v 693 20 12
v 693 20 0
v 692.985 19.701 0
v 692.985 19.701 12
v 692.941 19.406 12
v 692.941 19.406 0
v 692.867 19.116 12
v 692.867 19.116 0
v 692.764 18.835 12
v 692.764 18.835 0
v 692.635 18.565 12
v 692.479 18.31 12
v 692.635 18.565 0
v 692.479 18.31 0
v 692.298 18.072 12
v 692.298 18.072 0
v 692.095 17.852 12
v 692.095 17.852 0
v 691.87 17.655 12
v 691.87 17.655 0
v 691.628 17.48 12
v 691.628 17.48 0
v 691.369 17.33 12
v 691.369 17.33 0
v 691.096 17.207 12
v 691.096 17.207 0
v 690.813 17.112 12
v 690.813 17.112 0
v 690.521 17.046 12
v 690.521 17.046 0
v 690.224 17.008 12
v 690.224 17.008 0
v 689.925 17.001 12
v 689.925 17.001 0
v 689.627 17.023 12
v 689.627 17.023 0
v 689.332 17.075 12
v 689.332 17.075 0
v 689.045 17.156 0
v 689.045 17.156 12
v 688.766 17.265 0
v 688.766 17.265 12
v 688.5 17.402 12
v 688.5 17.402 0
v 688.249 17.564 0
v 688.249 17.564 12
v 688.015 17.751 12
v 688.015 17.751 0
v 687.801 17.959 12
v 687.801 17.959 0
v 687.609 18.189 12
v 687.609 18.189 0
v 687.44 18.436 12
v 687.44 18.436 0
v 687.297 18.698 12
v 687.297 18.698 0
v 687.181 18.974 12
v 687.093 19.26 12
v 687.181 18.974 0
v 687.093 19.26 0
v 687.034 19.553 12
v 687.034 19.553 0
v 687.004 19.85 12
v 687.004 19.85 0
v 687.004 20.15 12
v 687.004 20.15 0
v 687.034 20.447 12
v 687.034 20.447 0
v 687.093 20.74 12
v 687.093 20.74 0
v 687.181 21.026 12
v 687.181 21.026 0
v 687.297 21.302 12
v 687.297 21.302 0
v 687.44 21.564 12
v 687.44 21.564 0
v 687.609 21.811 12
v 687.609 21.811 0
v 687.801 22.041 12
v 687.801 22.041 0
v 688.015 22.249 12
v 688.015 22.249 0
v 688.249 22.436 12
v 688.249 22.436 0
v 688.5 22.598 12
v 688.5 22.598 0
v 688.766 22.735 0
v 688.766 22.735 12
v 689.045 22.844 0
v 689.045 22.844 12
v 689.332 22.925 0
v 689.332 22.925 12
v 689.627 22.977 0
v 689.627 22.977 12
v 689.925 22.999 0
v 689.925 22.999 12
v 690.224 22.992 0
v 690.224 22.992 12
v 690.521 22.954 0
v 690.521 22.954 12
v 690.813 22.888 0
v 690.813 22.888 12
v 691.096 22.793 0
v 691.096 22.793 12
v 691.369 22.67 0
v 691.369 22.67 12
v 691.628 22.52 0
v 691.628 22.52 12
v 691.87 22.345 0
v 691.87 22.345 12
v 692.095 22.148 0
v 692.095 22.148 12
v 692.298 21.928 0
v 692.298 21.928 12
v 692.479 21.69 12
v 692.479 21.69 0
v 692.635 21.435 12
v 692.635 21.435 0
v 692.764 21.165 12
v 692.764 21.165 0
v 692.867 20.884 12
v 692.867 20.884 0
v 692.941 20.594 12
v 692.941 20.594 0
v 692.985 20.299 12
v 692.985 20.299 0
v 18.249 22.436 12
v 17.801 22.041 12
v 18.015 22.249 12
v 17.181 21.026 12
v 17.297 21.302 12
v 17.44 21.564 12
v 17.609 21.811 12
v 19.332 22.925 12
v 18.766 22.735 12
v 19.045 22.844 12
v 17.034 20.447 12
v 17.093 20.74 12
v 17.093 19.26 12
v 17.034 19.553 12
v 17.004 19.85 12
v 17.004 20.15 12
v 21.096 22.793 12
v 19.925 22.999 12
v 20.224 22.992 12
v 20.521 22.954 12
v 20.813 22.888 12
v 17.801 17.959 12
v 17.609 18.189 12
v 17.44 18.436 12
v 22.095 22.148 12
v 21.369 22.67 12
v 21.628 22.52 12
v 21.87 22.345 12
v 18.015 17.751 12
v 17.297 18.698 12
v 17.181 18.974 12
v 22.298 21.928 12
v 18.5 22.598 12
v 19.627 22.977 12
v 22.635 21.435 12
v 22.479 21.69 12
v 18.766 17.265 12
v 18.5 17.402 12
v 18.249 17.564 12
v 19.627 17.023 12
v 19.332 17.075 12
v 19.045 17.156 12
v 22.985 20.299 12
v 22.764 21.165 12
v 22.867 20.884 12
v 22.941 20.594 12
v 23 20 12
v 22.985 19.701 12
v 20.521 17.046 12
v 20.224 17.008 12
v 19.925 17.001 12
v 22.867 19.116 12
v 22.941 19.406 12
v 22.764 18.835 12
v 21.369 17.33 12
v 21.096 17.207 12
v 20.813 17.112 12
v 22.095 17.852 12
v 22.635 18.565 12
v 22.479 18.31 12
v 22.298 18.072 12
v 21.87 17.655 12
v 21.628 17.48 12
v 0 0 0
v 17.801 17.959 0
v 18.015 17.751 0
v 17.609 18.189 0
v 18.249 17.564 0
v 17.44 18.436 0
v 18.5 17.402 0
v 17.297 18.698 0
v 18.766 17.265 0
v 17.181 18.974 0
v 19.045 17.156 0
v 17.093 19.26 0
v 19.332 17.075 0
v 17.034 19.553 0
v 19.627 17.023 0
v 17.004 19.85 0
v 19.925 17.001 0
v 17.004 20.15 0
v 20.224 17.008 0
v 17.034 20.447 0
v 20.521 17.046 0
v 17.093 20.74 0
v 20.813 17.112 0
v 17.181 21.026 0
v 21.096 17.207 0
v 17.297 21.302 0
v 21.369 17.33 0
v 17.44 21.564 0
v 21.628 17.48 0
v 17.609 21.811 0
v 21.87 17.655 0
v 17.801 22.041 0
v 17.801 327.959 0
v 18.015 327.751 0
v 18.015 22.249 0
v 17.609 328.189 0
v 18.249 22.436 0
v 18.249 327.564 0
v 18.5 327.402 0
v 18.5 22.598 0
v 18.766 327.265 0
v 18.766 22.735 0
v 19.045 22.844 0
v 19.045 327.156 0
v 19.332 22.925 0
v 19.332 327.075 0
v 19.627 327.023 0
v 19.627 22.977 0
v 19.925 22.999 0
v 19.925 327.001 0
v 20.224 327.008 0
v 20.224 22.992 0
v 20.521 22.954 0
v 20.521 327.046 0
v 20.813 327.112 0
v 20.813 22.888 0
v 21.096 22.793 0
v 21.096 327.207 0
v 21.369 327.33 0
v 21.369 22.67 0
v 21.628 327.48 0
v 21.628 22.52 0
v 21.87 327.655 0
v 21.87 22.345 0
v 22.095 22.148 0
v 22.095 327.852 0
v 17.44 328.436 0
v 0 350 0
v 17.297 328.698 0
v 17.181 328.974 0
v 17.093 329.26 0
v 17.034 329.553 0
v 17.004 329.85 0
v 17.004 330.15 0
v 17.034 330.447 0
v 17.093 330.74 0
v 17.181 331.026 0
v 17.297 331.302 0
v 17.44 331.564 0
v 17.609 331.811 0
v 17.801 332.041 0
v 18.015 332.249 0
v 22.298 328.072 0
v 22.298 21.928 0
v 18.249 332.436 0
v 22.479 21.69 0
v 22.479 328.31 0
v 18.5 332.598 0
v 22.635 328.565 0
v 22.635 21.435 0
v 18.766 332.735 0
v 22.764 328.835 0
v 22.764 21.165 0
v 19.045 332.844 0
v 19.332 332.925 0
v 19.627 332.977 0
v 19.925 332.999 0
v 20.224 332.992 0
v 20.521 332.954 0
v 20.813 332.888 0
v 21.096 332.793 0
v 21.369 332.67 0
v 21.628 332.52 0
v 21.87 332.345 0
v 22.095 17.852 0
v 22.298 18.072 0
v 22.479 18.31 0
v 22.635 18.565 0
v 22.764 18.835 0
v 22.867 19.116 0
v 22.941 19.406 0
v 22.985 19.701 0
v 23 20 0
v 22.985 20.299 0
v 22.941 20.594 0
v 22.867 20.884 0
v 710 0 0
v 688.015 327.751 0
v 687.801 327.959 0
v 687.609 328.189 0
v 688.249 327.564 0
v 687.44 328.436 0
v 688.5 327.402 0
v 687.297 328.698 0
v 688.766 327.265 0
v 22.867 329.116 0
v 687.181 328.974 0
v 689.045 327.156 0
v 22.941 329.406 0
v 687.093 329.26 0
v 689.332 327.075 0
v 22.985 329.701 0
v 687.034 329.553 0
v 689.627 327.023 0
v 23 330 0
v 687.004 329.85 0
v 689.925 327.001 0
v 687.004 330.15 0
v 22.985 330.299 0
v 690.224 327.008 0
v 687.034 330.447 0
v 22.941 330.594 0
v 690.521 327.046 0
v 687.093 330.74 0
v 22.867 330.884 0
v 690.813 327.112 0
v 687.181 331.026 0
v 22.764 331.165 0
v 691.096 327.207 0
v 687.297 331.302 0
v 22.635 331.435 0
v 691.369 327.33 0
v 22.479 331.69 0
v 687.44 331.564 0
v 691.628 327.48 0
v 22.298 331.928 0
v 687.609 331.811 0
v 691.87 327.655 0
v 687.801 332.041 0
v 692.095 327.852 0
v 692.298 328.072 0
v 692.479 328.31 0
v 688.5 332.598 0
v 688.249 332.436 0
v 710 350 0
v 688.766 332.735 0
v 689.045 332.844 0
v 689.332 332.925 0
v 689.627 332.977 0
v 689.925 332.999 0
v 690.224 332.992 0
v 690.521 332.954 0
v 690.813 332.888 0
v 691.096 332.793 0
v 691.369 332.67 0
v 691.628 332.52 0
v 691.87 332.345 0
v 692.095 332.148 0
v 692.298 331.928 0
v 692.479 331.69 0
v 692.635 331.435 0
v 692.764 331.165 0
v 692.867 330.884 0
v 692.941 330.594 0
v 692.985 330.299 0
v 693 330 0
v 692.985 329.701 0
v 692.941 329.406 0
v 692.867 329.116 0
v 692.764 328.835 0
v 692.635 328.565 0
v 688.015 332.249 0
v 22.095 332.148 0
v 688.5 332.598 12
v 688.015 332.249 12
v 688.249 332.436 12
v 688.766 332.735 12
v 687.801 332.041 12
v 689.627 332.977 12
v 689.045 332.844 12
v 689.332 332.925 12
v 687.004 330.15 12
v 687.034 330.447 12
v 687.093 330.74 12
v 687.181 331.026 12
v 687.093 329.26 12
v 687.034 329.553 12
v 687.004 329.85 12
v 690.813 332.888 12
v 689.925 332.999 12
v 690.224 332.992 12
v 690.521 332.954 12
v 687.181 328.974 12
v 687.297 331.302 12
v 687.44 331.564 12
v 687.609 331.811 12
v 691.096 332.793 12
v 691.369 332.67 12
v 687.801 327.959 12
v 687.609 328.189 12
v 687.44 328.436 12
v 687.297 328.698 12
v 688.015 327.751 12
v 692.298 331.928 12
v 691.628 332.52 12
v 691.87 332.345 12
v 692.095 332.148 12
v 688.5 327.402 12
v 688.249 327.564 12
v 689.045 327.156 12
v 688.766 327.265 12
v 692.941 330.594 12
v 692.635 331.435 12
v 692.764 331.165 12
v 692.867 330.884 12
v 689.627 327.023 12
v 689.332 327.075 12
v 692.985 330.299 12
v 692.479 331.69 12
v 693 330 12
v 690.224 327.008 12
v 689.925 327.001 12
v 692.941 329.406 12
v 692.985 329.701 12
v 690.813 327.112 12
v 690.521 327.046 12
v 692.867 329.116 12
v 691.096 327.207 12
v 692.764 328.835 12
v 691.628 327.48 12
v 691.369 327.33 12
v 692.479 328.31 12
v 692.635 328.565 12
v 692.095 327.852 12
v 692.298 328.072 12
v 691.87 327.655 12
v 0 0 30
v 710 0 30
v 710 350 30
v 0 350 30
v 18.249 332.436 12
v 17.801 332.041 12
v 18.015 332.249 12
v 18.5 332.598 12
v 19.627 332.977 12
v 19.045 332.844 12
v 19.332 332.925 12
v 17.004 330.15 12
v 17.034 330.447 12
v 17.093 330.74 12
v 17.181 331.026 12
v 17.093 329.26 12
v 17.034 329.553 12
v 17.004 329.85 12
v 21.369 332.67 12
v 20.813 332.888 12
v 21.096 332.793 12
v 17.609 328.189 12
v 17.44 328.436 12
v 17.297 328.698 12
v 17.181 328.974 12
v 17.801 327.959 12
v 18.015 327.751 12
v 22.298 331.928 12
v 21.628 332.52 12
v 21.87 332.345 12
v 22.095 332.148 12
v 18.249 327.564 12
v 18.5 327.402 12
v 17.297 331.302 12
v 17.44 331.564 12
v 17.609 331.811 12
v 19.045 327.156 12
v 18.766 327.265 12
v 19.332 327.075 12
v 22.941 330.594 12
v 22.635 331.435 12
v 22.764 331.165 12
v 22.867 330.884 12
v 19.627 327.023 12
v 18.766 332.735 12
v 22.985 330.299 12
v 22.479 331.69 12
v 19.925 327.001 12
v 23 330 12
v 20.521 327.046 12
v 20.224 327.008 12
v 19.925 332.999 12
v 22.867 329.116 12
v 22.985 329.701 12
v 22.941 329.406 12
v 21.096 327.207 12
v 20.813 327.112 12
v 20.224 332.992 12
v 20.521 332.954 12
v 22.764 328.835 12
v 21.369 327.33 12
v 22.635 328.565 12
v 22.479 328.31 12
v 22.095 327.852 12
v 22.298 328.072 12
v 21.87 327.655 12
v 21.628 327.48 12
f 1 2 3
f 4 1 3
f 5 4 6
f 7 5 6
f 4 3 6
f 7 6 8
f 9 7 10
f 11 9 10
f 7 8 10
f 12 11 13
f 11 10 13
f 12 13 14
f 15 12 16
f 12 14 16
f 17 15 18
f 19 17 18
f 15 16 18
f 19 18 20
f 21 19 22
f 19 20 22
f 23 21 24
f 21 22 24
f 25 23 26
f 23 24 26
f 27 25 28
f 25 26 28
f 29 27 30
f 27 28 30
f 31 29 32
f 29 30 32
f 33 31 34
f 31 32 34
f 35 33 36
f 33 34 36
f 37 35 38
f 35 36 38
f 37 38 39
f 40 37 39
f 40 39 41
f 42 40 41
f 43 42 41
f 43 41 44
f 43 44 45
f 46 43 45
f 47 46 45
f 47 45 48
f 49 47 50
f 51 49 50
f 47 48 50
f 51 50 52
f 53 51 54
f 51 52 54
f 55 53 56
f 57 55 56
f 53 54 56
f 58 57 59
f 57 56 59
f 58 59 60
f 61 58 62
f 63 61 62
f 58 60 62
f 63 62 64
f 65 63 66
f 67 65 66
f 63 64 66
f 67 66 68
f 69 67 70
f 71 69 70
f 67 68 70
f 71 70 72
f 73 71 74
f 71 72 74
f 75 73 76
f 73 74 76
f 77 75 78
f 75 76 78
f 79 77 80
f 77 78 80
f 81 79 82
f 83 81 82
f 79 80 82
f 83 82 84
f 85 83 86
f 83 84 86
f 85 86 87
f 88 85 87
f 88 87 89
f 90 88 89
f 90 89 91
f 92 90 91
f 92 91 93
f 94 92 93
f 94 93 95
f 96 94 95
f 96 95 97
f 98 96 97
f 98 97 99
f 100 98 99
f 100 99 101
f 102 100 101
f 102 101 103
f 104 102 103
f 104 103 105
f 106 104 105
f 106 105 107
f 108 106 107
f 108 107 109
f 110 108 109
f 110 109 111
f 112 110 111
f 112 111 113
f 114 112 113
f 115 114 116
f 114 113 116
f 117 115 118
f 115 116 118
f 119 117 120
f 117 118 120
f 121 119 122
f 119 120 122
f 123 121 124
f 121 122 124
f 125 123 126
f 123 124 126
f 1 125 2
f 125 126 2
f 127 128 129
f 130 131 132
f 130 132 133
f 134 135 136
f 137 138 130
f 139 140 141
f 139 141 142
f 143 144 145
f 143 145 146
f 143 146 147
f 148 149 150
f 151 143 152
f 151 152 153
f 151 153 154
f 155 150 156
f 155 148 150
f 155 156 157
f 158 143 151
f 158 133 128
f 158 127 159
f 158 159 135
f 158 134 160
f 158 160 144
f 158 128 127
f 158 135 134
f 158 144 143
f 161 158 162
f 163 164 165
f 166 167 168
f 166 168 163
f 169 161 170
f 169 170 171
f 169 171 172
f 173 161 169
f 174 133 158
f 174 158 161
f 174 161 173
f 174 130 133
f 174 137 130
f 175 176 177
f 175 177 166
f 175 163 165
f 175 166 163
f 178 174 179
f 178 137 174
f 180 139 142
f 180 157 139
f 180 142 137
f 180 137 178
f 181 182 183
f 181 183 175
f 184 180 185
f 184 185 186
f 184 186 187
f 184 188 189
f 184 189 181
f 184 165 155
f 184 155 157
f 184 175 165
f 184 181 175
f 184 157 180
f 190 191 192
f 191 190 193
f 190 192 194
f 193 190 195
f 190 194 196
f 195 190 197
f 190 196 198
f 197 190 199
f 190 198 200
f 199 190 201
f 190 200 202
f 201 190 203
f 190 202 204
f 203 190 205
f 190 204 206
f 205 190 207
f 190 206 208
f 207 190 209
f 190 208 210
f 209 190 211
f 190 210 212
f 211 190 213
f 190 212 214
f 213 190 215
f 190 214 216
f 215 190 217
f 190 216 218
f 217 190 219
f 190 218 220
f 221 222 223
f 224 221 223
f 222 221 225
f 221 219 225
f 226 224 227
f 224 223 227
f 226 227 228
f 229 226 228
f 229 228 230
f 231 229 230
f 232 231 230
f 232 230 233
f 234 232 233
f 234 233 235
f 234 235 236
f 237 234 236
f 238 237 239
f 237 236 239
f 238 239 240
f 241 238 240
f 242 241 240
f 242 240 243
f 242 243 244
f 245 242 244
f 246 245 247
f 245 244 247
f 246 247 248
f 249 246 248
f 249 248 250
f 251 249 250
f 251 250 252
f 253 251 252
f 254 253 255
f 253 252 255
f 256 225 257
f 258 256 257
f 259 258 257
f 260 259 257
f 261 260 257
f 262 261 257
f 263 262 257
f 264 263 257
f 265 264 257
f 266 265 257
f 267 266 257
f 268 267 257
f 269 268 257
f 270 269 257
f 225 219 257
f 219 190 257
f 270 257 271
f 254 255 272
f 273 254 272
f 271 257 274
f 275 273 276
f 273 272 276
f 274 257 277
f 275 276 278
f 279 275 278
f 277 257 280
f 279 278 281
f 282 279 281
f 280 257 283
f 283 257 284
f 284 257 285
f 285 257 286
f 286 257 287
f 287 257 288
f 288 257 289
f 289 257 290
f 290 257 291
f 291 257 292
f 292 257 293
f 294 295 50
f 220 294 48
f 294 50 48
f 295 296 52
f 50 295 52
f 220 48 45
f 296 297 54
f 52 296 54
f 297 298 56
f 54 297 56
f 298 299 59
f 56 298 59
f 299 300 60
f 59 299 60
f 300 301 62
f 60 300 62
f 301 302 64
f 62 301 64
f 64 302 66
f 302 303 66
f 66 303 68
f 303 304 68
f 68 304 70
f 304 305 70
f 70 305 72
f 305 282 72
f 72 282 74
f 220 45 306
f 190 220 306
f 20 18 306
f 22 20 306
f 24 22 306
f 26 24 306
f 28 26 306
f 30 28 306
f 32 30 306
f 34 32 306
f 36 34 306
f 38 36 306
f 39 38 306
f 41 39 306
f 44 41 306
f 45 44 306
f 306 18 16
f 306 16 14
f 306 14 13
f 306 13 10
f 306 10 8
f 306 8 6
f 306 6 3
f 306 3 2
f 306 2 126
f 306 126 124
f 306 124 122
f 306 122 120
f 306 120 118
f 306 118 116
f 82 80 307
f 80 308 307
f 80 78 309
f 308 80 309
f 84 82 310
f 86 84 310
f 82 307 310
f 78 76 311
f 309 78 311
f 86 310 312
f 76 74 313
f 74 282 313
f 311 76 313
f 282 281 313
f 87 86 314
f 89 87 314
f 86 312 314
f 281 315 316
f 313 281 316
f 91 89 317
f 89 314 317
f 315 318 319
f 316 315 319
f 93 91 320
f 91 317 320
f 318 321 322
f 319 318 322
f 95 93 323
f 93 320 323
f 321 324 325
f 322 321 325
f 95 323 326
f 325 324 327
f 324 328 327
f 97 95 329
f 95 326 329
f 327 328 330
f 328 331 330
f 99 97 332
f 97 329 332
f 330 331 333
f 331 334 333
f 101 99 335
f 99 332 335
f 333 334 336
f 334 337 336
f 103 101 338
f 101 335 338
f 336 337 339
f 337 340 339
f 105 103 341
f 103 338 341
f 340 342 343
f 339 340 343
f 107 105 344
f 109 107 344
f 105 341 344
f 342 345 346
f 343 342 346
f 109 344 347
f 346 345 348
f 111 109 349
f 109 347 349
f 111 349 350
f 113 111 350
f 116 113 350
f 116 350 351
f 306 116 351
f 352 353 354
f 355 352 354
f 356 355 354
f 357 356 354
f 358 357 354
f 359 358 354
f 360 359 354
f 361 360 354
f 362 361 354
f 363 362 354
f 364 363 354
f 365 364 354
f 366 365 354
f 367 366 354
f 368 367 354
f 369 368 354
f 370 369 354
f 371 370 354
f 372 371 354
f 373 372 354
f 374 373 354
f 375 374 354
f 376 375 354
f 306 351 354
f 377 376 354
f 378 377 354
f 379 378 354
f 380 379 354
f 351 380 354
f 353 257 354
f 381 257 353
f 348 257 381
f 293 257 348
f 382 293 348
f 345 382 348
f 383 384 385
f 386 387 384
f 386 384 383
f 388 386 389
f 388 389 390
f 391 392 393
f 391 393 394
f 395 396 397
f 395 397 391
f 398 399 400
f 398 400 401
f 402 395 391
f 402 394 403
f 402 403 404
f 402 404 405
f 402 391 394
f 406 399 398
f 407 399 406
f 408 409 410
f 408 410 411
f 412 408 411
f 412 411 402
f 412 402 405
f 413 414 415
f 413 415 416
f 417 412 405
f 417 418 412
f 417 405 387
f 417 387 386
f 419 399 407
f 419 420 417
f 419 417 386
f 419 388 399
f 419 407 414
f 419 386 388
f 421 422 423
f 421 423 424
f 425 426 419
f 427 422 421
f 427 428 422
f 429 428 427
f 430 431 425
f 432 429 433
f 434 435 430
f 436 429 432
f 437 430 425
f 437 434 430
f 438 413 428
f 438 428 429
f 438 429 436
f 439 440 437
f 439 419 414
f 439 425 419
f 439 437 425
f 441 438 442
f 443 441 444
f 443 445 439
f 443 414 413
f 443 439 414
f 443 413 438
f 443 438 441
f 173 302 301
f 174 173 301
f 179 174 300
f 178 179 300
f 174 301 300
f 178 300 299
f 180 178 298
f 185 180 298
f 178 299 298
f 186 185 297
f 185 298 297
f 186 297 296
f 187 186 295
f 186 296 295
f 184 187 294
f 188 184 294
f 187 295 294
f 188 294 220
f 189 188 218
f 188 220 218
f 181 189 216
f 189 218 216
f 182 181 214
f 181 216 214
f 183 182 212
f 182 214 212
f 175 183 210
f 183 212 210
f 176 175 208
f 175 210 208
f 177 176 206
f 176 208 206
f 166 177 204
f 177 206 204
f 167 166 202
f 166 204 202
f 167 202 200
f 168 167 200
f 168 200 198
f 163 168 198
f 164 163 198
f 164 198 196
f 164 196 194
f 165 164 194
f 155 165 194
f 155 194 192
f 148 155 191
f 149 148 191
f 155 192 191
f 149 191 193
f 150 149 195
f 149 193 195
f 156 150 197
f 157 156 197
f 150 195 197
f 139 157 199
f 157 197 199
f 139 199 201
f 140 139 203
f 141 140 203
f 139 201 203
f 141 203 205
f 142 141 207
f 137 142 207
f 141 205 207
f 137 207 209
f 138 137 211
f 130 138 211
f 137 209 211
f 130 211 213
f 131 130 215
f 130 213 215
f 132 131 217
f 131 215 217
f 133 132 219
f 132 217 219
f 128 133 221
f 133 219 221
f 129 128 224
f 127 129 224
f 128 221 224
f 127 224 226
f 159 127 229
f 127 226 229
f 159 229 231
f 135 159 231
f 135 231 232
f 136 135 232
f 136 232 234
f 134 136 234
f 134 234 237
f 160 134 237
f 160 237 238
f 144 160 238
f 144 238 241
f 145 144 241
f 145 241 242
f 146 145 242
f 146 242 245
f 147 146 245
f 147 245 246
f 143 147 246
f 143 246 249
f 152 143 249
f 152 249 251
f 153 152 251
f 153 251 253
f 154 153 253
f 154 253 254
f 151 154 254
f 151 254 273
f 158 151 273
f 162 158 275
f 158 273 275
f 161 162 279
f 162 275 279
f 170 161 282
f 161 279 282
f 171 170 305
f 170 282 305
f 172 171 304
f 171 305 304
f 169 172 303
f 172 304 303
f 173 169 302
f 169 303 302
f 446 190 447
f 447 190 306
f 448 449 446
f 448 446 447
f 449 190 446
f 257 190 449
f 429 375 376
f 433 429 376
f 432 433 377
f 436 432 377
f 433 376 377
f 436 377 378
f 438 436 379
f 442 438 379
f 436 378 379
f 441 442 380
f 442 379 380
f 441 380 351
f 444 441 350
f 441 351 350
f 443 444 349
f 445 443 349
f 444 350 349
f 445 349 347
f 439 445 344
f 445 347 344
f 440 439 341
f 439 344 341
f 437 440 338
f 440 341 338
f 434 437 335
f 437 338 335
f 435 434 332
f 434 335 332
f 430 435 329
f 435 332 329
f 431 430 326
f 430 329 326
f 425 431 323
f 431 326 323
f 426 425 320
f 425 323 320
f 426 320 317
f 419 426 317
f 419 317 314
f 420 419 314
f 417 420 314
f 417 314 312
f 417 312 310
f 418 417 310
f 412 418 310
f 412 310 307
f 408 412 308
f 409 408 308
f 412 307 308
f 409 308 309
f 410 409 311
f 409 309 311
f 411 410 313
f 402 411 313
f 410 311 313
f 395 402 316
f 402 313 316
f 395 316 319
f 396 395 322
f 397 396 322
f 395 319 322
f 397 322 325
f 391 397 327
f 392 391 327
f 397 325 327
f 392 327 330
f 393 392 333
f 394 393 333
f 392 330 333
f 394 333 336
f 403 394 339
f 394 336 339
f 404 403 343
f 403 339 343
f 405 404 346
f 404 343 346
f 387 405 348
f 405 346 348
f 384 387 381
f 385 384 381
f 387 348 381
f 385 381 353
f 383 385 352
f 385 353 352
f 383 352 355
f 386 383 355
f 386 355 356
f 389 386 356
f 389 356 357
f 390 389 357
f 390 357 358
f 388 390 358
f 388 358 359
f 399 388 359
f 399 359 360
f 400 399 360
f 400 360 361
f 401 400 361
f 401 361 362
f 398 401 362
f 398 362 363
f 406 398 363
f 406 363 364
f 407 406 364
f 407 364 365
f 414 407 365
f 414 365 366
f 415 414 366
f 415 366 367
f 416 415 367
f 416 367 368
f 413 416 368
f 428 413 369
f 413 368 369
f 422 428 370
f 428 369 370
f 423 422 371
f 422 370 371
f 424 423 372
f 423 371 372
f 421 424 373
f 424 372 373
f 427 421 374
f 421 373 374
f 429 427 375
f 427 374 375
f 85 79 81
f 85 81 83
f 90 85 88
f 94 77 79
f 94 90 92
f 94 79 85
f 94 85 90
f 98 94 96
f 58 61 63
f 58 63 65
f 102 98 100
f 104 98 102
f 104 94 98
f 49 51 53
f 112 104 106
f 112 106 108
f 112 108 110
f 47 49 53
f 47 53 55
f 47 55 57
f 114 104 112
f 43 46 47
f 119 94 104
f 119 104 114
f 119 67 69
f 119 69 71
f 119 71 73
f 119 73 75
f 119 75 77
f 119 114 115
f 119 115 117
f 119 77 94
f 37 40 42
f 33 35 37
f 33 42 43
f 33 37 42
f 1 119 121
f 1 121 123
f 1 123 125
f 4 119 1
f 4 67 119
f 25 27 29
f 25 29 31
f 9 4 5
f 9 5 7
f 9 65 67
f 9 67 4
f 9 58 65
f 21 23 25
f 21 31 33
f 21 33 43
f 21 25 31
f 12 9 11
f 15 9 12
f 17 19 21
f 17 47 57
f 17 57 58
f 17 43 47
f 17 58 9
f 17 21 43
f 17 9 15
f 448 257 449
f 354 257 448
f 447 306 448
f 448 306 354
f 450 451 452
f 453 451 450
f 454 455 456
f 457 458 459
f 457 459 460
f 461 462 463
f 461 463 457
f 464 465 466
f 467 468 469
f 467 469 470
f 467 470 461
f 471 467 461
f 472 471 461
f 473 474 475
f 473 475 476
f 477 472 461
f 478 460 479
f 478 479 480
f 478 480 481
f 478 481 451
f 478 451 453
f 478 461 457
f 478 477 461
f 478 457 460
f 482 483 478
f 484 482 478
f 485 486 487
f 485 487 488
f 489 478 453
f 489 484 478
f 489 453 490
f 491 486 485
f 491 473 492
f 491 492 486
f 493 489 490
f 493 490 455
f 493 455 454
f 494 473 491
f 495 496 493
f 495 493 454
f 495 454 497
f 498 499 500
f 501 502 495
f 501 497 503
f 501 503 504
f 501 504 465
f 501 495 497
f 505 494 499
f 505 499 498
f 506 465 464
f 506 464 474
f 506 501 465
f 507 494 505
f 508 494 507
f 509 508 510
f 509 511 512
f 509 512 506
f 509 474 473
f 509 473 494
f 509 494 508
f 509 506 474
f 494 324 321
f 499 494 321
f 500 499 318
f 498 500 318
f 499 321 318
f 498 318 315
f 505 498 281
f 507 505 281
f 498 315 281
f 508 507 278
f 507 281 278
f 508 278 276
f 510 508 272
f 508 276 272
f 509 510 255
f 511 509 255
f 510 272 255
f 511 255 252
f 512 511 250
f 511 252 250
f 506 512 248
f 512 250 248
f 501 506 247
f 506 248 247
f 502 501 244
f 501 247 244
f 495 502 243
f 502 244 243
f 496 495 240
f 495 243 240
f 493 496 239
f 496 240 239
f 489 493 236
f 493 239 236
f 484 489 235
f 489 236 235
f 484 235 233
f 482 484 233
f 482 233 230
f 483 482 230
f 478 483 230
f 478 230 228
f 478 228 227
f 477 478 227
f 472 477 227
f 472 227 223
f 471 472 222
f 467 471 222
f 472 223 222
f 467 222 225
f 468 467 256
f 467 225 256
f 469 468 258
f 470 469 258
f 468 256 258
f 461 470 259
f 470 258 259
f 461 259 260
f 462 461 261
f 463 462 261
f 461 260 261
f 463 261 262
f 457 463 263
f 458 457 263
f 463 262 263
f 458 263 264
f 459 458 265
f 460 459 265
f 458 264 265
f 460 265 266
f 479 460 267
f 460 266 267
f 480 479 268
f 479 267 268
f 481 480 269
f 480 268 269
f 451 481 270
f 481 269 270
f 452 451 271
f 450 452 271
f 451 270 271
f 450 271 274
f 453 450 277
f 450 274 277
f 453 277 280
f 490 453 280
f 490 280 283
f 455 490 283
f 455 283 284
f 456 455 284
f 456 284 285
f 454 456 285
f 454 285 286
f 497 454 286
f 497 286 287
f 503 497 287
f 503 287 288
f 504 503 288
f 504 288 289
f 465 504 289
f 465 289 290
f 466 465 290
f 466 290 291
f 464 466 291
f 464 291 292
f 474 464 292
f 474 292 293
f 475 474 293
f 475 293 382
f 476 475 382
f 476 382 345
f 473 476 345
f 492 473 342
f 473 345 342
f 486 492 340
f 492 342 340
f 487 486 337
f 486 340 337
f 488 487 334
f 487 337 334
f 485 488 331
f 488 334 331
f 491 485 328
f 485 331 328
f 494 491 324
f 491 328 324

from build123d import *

# Parameters (mm, degrees)
F0_W     = 710
F0_H     = 350
F1_DEPTH = 30
F2_R     = 3
F3_DEPTH = 12
F4_R     = 3
F5_DEPTH = 12


with BuildPart() as f1:
    # F0 (on Top) → F1 (new body)
    with BuildSketch(Plane.XY):
        with Locations((355, 175)):
            Rectangle(F0_W, F0_H)
    extrude(amount=F1_DEPTH)

    # F2 (on face) → F3 (cut)
    with BuildSketch(Plane(origin=(0, 0, 0), x_dir=(1, 0, 0), z_dir=(0, 0, -1))):
        with Locations((20, -20)):
            Circle(F2_R)
        with Locations((690, -20)):
            Circle(F2_R)
        with Locations((690, -330)):
            Circle(F2_R)
        with Locations((20, -330)):
            Circle(F2_R)
    extrude(amount=-F3_DEPTH, mode=Mode.SUBTRACT)

    # F4 (on face) → F5 (cut)
    with BuildSketch(Plane(origin=(0, 0, 0), x_dir=(1, 0, 0), z_dir=(0, 0, -1))):
        with Locations((20, -330)):
            Circle(F4_R)
    extrude(amount=-F5_DEPTH, mode=Mode.SUBTRACT)


solid = f1.part
